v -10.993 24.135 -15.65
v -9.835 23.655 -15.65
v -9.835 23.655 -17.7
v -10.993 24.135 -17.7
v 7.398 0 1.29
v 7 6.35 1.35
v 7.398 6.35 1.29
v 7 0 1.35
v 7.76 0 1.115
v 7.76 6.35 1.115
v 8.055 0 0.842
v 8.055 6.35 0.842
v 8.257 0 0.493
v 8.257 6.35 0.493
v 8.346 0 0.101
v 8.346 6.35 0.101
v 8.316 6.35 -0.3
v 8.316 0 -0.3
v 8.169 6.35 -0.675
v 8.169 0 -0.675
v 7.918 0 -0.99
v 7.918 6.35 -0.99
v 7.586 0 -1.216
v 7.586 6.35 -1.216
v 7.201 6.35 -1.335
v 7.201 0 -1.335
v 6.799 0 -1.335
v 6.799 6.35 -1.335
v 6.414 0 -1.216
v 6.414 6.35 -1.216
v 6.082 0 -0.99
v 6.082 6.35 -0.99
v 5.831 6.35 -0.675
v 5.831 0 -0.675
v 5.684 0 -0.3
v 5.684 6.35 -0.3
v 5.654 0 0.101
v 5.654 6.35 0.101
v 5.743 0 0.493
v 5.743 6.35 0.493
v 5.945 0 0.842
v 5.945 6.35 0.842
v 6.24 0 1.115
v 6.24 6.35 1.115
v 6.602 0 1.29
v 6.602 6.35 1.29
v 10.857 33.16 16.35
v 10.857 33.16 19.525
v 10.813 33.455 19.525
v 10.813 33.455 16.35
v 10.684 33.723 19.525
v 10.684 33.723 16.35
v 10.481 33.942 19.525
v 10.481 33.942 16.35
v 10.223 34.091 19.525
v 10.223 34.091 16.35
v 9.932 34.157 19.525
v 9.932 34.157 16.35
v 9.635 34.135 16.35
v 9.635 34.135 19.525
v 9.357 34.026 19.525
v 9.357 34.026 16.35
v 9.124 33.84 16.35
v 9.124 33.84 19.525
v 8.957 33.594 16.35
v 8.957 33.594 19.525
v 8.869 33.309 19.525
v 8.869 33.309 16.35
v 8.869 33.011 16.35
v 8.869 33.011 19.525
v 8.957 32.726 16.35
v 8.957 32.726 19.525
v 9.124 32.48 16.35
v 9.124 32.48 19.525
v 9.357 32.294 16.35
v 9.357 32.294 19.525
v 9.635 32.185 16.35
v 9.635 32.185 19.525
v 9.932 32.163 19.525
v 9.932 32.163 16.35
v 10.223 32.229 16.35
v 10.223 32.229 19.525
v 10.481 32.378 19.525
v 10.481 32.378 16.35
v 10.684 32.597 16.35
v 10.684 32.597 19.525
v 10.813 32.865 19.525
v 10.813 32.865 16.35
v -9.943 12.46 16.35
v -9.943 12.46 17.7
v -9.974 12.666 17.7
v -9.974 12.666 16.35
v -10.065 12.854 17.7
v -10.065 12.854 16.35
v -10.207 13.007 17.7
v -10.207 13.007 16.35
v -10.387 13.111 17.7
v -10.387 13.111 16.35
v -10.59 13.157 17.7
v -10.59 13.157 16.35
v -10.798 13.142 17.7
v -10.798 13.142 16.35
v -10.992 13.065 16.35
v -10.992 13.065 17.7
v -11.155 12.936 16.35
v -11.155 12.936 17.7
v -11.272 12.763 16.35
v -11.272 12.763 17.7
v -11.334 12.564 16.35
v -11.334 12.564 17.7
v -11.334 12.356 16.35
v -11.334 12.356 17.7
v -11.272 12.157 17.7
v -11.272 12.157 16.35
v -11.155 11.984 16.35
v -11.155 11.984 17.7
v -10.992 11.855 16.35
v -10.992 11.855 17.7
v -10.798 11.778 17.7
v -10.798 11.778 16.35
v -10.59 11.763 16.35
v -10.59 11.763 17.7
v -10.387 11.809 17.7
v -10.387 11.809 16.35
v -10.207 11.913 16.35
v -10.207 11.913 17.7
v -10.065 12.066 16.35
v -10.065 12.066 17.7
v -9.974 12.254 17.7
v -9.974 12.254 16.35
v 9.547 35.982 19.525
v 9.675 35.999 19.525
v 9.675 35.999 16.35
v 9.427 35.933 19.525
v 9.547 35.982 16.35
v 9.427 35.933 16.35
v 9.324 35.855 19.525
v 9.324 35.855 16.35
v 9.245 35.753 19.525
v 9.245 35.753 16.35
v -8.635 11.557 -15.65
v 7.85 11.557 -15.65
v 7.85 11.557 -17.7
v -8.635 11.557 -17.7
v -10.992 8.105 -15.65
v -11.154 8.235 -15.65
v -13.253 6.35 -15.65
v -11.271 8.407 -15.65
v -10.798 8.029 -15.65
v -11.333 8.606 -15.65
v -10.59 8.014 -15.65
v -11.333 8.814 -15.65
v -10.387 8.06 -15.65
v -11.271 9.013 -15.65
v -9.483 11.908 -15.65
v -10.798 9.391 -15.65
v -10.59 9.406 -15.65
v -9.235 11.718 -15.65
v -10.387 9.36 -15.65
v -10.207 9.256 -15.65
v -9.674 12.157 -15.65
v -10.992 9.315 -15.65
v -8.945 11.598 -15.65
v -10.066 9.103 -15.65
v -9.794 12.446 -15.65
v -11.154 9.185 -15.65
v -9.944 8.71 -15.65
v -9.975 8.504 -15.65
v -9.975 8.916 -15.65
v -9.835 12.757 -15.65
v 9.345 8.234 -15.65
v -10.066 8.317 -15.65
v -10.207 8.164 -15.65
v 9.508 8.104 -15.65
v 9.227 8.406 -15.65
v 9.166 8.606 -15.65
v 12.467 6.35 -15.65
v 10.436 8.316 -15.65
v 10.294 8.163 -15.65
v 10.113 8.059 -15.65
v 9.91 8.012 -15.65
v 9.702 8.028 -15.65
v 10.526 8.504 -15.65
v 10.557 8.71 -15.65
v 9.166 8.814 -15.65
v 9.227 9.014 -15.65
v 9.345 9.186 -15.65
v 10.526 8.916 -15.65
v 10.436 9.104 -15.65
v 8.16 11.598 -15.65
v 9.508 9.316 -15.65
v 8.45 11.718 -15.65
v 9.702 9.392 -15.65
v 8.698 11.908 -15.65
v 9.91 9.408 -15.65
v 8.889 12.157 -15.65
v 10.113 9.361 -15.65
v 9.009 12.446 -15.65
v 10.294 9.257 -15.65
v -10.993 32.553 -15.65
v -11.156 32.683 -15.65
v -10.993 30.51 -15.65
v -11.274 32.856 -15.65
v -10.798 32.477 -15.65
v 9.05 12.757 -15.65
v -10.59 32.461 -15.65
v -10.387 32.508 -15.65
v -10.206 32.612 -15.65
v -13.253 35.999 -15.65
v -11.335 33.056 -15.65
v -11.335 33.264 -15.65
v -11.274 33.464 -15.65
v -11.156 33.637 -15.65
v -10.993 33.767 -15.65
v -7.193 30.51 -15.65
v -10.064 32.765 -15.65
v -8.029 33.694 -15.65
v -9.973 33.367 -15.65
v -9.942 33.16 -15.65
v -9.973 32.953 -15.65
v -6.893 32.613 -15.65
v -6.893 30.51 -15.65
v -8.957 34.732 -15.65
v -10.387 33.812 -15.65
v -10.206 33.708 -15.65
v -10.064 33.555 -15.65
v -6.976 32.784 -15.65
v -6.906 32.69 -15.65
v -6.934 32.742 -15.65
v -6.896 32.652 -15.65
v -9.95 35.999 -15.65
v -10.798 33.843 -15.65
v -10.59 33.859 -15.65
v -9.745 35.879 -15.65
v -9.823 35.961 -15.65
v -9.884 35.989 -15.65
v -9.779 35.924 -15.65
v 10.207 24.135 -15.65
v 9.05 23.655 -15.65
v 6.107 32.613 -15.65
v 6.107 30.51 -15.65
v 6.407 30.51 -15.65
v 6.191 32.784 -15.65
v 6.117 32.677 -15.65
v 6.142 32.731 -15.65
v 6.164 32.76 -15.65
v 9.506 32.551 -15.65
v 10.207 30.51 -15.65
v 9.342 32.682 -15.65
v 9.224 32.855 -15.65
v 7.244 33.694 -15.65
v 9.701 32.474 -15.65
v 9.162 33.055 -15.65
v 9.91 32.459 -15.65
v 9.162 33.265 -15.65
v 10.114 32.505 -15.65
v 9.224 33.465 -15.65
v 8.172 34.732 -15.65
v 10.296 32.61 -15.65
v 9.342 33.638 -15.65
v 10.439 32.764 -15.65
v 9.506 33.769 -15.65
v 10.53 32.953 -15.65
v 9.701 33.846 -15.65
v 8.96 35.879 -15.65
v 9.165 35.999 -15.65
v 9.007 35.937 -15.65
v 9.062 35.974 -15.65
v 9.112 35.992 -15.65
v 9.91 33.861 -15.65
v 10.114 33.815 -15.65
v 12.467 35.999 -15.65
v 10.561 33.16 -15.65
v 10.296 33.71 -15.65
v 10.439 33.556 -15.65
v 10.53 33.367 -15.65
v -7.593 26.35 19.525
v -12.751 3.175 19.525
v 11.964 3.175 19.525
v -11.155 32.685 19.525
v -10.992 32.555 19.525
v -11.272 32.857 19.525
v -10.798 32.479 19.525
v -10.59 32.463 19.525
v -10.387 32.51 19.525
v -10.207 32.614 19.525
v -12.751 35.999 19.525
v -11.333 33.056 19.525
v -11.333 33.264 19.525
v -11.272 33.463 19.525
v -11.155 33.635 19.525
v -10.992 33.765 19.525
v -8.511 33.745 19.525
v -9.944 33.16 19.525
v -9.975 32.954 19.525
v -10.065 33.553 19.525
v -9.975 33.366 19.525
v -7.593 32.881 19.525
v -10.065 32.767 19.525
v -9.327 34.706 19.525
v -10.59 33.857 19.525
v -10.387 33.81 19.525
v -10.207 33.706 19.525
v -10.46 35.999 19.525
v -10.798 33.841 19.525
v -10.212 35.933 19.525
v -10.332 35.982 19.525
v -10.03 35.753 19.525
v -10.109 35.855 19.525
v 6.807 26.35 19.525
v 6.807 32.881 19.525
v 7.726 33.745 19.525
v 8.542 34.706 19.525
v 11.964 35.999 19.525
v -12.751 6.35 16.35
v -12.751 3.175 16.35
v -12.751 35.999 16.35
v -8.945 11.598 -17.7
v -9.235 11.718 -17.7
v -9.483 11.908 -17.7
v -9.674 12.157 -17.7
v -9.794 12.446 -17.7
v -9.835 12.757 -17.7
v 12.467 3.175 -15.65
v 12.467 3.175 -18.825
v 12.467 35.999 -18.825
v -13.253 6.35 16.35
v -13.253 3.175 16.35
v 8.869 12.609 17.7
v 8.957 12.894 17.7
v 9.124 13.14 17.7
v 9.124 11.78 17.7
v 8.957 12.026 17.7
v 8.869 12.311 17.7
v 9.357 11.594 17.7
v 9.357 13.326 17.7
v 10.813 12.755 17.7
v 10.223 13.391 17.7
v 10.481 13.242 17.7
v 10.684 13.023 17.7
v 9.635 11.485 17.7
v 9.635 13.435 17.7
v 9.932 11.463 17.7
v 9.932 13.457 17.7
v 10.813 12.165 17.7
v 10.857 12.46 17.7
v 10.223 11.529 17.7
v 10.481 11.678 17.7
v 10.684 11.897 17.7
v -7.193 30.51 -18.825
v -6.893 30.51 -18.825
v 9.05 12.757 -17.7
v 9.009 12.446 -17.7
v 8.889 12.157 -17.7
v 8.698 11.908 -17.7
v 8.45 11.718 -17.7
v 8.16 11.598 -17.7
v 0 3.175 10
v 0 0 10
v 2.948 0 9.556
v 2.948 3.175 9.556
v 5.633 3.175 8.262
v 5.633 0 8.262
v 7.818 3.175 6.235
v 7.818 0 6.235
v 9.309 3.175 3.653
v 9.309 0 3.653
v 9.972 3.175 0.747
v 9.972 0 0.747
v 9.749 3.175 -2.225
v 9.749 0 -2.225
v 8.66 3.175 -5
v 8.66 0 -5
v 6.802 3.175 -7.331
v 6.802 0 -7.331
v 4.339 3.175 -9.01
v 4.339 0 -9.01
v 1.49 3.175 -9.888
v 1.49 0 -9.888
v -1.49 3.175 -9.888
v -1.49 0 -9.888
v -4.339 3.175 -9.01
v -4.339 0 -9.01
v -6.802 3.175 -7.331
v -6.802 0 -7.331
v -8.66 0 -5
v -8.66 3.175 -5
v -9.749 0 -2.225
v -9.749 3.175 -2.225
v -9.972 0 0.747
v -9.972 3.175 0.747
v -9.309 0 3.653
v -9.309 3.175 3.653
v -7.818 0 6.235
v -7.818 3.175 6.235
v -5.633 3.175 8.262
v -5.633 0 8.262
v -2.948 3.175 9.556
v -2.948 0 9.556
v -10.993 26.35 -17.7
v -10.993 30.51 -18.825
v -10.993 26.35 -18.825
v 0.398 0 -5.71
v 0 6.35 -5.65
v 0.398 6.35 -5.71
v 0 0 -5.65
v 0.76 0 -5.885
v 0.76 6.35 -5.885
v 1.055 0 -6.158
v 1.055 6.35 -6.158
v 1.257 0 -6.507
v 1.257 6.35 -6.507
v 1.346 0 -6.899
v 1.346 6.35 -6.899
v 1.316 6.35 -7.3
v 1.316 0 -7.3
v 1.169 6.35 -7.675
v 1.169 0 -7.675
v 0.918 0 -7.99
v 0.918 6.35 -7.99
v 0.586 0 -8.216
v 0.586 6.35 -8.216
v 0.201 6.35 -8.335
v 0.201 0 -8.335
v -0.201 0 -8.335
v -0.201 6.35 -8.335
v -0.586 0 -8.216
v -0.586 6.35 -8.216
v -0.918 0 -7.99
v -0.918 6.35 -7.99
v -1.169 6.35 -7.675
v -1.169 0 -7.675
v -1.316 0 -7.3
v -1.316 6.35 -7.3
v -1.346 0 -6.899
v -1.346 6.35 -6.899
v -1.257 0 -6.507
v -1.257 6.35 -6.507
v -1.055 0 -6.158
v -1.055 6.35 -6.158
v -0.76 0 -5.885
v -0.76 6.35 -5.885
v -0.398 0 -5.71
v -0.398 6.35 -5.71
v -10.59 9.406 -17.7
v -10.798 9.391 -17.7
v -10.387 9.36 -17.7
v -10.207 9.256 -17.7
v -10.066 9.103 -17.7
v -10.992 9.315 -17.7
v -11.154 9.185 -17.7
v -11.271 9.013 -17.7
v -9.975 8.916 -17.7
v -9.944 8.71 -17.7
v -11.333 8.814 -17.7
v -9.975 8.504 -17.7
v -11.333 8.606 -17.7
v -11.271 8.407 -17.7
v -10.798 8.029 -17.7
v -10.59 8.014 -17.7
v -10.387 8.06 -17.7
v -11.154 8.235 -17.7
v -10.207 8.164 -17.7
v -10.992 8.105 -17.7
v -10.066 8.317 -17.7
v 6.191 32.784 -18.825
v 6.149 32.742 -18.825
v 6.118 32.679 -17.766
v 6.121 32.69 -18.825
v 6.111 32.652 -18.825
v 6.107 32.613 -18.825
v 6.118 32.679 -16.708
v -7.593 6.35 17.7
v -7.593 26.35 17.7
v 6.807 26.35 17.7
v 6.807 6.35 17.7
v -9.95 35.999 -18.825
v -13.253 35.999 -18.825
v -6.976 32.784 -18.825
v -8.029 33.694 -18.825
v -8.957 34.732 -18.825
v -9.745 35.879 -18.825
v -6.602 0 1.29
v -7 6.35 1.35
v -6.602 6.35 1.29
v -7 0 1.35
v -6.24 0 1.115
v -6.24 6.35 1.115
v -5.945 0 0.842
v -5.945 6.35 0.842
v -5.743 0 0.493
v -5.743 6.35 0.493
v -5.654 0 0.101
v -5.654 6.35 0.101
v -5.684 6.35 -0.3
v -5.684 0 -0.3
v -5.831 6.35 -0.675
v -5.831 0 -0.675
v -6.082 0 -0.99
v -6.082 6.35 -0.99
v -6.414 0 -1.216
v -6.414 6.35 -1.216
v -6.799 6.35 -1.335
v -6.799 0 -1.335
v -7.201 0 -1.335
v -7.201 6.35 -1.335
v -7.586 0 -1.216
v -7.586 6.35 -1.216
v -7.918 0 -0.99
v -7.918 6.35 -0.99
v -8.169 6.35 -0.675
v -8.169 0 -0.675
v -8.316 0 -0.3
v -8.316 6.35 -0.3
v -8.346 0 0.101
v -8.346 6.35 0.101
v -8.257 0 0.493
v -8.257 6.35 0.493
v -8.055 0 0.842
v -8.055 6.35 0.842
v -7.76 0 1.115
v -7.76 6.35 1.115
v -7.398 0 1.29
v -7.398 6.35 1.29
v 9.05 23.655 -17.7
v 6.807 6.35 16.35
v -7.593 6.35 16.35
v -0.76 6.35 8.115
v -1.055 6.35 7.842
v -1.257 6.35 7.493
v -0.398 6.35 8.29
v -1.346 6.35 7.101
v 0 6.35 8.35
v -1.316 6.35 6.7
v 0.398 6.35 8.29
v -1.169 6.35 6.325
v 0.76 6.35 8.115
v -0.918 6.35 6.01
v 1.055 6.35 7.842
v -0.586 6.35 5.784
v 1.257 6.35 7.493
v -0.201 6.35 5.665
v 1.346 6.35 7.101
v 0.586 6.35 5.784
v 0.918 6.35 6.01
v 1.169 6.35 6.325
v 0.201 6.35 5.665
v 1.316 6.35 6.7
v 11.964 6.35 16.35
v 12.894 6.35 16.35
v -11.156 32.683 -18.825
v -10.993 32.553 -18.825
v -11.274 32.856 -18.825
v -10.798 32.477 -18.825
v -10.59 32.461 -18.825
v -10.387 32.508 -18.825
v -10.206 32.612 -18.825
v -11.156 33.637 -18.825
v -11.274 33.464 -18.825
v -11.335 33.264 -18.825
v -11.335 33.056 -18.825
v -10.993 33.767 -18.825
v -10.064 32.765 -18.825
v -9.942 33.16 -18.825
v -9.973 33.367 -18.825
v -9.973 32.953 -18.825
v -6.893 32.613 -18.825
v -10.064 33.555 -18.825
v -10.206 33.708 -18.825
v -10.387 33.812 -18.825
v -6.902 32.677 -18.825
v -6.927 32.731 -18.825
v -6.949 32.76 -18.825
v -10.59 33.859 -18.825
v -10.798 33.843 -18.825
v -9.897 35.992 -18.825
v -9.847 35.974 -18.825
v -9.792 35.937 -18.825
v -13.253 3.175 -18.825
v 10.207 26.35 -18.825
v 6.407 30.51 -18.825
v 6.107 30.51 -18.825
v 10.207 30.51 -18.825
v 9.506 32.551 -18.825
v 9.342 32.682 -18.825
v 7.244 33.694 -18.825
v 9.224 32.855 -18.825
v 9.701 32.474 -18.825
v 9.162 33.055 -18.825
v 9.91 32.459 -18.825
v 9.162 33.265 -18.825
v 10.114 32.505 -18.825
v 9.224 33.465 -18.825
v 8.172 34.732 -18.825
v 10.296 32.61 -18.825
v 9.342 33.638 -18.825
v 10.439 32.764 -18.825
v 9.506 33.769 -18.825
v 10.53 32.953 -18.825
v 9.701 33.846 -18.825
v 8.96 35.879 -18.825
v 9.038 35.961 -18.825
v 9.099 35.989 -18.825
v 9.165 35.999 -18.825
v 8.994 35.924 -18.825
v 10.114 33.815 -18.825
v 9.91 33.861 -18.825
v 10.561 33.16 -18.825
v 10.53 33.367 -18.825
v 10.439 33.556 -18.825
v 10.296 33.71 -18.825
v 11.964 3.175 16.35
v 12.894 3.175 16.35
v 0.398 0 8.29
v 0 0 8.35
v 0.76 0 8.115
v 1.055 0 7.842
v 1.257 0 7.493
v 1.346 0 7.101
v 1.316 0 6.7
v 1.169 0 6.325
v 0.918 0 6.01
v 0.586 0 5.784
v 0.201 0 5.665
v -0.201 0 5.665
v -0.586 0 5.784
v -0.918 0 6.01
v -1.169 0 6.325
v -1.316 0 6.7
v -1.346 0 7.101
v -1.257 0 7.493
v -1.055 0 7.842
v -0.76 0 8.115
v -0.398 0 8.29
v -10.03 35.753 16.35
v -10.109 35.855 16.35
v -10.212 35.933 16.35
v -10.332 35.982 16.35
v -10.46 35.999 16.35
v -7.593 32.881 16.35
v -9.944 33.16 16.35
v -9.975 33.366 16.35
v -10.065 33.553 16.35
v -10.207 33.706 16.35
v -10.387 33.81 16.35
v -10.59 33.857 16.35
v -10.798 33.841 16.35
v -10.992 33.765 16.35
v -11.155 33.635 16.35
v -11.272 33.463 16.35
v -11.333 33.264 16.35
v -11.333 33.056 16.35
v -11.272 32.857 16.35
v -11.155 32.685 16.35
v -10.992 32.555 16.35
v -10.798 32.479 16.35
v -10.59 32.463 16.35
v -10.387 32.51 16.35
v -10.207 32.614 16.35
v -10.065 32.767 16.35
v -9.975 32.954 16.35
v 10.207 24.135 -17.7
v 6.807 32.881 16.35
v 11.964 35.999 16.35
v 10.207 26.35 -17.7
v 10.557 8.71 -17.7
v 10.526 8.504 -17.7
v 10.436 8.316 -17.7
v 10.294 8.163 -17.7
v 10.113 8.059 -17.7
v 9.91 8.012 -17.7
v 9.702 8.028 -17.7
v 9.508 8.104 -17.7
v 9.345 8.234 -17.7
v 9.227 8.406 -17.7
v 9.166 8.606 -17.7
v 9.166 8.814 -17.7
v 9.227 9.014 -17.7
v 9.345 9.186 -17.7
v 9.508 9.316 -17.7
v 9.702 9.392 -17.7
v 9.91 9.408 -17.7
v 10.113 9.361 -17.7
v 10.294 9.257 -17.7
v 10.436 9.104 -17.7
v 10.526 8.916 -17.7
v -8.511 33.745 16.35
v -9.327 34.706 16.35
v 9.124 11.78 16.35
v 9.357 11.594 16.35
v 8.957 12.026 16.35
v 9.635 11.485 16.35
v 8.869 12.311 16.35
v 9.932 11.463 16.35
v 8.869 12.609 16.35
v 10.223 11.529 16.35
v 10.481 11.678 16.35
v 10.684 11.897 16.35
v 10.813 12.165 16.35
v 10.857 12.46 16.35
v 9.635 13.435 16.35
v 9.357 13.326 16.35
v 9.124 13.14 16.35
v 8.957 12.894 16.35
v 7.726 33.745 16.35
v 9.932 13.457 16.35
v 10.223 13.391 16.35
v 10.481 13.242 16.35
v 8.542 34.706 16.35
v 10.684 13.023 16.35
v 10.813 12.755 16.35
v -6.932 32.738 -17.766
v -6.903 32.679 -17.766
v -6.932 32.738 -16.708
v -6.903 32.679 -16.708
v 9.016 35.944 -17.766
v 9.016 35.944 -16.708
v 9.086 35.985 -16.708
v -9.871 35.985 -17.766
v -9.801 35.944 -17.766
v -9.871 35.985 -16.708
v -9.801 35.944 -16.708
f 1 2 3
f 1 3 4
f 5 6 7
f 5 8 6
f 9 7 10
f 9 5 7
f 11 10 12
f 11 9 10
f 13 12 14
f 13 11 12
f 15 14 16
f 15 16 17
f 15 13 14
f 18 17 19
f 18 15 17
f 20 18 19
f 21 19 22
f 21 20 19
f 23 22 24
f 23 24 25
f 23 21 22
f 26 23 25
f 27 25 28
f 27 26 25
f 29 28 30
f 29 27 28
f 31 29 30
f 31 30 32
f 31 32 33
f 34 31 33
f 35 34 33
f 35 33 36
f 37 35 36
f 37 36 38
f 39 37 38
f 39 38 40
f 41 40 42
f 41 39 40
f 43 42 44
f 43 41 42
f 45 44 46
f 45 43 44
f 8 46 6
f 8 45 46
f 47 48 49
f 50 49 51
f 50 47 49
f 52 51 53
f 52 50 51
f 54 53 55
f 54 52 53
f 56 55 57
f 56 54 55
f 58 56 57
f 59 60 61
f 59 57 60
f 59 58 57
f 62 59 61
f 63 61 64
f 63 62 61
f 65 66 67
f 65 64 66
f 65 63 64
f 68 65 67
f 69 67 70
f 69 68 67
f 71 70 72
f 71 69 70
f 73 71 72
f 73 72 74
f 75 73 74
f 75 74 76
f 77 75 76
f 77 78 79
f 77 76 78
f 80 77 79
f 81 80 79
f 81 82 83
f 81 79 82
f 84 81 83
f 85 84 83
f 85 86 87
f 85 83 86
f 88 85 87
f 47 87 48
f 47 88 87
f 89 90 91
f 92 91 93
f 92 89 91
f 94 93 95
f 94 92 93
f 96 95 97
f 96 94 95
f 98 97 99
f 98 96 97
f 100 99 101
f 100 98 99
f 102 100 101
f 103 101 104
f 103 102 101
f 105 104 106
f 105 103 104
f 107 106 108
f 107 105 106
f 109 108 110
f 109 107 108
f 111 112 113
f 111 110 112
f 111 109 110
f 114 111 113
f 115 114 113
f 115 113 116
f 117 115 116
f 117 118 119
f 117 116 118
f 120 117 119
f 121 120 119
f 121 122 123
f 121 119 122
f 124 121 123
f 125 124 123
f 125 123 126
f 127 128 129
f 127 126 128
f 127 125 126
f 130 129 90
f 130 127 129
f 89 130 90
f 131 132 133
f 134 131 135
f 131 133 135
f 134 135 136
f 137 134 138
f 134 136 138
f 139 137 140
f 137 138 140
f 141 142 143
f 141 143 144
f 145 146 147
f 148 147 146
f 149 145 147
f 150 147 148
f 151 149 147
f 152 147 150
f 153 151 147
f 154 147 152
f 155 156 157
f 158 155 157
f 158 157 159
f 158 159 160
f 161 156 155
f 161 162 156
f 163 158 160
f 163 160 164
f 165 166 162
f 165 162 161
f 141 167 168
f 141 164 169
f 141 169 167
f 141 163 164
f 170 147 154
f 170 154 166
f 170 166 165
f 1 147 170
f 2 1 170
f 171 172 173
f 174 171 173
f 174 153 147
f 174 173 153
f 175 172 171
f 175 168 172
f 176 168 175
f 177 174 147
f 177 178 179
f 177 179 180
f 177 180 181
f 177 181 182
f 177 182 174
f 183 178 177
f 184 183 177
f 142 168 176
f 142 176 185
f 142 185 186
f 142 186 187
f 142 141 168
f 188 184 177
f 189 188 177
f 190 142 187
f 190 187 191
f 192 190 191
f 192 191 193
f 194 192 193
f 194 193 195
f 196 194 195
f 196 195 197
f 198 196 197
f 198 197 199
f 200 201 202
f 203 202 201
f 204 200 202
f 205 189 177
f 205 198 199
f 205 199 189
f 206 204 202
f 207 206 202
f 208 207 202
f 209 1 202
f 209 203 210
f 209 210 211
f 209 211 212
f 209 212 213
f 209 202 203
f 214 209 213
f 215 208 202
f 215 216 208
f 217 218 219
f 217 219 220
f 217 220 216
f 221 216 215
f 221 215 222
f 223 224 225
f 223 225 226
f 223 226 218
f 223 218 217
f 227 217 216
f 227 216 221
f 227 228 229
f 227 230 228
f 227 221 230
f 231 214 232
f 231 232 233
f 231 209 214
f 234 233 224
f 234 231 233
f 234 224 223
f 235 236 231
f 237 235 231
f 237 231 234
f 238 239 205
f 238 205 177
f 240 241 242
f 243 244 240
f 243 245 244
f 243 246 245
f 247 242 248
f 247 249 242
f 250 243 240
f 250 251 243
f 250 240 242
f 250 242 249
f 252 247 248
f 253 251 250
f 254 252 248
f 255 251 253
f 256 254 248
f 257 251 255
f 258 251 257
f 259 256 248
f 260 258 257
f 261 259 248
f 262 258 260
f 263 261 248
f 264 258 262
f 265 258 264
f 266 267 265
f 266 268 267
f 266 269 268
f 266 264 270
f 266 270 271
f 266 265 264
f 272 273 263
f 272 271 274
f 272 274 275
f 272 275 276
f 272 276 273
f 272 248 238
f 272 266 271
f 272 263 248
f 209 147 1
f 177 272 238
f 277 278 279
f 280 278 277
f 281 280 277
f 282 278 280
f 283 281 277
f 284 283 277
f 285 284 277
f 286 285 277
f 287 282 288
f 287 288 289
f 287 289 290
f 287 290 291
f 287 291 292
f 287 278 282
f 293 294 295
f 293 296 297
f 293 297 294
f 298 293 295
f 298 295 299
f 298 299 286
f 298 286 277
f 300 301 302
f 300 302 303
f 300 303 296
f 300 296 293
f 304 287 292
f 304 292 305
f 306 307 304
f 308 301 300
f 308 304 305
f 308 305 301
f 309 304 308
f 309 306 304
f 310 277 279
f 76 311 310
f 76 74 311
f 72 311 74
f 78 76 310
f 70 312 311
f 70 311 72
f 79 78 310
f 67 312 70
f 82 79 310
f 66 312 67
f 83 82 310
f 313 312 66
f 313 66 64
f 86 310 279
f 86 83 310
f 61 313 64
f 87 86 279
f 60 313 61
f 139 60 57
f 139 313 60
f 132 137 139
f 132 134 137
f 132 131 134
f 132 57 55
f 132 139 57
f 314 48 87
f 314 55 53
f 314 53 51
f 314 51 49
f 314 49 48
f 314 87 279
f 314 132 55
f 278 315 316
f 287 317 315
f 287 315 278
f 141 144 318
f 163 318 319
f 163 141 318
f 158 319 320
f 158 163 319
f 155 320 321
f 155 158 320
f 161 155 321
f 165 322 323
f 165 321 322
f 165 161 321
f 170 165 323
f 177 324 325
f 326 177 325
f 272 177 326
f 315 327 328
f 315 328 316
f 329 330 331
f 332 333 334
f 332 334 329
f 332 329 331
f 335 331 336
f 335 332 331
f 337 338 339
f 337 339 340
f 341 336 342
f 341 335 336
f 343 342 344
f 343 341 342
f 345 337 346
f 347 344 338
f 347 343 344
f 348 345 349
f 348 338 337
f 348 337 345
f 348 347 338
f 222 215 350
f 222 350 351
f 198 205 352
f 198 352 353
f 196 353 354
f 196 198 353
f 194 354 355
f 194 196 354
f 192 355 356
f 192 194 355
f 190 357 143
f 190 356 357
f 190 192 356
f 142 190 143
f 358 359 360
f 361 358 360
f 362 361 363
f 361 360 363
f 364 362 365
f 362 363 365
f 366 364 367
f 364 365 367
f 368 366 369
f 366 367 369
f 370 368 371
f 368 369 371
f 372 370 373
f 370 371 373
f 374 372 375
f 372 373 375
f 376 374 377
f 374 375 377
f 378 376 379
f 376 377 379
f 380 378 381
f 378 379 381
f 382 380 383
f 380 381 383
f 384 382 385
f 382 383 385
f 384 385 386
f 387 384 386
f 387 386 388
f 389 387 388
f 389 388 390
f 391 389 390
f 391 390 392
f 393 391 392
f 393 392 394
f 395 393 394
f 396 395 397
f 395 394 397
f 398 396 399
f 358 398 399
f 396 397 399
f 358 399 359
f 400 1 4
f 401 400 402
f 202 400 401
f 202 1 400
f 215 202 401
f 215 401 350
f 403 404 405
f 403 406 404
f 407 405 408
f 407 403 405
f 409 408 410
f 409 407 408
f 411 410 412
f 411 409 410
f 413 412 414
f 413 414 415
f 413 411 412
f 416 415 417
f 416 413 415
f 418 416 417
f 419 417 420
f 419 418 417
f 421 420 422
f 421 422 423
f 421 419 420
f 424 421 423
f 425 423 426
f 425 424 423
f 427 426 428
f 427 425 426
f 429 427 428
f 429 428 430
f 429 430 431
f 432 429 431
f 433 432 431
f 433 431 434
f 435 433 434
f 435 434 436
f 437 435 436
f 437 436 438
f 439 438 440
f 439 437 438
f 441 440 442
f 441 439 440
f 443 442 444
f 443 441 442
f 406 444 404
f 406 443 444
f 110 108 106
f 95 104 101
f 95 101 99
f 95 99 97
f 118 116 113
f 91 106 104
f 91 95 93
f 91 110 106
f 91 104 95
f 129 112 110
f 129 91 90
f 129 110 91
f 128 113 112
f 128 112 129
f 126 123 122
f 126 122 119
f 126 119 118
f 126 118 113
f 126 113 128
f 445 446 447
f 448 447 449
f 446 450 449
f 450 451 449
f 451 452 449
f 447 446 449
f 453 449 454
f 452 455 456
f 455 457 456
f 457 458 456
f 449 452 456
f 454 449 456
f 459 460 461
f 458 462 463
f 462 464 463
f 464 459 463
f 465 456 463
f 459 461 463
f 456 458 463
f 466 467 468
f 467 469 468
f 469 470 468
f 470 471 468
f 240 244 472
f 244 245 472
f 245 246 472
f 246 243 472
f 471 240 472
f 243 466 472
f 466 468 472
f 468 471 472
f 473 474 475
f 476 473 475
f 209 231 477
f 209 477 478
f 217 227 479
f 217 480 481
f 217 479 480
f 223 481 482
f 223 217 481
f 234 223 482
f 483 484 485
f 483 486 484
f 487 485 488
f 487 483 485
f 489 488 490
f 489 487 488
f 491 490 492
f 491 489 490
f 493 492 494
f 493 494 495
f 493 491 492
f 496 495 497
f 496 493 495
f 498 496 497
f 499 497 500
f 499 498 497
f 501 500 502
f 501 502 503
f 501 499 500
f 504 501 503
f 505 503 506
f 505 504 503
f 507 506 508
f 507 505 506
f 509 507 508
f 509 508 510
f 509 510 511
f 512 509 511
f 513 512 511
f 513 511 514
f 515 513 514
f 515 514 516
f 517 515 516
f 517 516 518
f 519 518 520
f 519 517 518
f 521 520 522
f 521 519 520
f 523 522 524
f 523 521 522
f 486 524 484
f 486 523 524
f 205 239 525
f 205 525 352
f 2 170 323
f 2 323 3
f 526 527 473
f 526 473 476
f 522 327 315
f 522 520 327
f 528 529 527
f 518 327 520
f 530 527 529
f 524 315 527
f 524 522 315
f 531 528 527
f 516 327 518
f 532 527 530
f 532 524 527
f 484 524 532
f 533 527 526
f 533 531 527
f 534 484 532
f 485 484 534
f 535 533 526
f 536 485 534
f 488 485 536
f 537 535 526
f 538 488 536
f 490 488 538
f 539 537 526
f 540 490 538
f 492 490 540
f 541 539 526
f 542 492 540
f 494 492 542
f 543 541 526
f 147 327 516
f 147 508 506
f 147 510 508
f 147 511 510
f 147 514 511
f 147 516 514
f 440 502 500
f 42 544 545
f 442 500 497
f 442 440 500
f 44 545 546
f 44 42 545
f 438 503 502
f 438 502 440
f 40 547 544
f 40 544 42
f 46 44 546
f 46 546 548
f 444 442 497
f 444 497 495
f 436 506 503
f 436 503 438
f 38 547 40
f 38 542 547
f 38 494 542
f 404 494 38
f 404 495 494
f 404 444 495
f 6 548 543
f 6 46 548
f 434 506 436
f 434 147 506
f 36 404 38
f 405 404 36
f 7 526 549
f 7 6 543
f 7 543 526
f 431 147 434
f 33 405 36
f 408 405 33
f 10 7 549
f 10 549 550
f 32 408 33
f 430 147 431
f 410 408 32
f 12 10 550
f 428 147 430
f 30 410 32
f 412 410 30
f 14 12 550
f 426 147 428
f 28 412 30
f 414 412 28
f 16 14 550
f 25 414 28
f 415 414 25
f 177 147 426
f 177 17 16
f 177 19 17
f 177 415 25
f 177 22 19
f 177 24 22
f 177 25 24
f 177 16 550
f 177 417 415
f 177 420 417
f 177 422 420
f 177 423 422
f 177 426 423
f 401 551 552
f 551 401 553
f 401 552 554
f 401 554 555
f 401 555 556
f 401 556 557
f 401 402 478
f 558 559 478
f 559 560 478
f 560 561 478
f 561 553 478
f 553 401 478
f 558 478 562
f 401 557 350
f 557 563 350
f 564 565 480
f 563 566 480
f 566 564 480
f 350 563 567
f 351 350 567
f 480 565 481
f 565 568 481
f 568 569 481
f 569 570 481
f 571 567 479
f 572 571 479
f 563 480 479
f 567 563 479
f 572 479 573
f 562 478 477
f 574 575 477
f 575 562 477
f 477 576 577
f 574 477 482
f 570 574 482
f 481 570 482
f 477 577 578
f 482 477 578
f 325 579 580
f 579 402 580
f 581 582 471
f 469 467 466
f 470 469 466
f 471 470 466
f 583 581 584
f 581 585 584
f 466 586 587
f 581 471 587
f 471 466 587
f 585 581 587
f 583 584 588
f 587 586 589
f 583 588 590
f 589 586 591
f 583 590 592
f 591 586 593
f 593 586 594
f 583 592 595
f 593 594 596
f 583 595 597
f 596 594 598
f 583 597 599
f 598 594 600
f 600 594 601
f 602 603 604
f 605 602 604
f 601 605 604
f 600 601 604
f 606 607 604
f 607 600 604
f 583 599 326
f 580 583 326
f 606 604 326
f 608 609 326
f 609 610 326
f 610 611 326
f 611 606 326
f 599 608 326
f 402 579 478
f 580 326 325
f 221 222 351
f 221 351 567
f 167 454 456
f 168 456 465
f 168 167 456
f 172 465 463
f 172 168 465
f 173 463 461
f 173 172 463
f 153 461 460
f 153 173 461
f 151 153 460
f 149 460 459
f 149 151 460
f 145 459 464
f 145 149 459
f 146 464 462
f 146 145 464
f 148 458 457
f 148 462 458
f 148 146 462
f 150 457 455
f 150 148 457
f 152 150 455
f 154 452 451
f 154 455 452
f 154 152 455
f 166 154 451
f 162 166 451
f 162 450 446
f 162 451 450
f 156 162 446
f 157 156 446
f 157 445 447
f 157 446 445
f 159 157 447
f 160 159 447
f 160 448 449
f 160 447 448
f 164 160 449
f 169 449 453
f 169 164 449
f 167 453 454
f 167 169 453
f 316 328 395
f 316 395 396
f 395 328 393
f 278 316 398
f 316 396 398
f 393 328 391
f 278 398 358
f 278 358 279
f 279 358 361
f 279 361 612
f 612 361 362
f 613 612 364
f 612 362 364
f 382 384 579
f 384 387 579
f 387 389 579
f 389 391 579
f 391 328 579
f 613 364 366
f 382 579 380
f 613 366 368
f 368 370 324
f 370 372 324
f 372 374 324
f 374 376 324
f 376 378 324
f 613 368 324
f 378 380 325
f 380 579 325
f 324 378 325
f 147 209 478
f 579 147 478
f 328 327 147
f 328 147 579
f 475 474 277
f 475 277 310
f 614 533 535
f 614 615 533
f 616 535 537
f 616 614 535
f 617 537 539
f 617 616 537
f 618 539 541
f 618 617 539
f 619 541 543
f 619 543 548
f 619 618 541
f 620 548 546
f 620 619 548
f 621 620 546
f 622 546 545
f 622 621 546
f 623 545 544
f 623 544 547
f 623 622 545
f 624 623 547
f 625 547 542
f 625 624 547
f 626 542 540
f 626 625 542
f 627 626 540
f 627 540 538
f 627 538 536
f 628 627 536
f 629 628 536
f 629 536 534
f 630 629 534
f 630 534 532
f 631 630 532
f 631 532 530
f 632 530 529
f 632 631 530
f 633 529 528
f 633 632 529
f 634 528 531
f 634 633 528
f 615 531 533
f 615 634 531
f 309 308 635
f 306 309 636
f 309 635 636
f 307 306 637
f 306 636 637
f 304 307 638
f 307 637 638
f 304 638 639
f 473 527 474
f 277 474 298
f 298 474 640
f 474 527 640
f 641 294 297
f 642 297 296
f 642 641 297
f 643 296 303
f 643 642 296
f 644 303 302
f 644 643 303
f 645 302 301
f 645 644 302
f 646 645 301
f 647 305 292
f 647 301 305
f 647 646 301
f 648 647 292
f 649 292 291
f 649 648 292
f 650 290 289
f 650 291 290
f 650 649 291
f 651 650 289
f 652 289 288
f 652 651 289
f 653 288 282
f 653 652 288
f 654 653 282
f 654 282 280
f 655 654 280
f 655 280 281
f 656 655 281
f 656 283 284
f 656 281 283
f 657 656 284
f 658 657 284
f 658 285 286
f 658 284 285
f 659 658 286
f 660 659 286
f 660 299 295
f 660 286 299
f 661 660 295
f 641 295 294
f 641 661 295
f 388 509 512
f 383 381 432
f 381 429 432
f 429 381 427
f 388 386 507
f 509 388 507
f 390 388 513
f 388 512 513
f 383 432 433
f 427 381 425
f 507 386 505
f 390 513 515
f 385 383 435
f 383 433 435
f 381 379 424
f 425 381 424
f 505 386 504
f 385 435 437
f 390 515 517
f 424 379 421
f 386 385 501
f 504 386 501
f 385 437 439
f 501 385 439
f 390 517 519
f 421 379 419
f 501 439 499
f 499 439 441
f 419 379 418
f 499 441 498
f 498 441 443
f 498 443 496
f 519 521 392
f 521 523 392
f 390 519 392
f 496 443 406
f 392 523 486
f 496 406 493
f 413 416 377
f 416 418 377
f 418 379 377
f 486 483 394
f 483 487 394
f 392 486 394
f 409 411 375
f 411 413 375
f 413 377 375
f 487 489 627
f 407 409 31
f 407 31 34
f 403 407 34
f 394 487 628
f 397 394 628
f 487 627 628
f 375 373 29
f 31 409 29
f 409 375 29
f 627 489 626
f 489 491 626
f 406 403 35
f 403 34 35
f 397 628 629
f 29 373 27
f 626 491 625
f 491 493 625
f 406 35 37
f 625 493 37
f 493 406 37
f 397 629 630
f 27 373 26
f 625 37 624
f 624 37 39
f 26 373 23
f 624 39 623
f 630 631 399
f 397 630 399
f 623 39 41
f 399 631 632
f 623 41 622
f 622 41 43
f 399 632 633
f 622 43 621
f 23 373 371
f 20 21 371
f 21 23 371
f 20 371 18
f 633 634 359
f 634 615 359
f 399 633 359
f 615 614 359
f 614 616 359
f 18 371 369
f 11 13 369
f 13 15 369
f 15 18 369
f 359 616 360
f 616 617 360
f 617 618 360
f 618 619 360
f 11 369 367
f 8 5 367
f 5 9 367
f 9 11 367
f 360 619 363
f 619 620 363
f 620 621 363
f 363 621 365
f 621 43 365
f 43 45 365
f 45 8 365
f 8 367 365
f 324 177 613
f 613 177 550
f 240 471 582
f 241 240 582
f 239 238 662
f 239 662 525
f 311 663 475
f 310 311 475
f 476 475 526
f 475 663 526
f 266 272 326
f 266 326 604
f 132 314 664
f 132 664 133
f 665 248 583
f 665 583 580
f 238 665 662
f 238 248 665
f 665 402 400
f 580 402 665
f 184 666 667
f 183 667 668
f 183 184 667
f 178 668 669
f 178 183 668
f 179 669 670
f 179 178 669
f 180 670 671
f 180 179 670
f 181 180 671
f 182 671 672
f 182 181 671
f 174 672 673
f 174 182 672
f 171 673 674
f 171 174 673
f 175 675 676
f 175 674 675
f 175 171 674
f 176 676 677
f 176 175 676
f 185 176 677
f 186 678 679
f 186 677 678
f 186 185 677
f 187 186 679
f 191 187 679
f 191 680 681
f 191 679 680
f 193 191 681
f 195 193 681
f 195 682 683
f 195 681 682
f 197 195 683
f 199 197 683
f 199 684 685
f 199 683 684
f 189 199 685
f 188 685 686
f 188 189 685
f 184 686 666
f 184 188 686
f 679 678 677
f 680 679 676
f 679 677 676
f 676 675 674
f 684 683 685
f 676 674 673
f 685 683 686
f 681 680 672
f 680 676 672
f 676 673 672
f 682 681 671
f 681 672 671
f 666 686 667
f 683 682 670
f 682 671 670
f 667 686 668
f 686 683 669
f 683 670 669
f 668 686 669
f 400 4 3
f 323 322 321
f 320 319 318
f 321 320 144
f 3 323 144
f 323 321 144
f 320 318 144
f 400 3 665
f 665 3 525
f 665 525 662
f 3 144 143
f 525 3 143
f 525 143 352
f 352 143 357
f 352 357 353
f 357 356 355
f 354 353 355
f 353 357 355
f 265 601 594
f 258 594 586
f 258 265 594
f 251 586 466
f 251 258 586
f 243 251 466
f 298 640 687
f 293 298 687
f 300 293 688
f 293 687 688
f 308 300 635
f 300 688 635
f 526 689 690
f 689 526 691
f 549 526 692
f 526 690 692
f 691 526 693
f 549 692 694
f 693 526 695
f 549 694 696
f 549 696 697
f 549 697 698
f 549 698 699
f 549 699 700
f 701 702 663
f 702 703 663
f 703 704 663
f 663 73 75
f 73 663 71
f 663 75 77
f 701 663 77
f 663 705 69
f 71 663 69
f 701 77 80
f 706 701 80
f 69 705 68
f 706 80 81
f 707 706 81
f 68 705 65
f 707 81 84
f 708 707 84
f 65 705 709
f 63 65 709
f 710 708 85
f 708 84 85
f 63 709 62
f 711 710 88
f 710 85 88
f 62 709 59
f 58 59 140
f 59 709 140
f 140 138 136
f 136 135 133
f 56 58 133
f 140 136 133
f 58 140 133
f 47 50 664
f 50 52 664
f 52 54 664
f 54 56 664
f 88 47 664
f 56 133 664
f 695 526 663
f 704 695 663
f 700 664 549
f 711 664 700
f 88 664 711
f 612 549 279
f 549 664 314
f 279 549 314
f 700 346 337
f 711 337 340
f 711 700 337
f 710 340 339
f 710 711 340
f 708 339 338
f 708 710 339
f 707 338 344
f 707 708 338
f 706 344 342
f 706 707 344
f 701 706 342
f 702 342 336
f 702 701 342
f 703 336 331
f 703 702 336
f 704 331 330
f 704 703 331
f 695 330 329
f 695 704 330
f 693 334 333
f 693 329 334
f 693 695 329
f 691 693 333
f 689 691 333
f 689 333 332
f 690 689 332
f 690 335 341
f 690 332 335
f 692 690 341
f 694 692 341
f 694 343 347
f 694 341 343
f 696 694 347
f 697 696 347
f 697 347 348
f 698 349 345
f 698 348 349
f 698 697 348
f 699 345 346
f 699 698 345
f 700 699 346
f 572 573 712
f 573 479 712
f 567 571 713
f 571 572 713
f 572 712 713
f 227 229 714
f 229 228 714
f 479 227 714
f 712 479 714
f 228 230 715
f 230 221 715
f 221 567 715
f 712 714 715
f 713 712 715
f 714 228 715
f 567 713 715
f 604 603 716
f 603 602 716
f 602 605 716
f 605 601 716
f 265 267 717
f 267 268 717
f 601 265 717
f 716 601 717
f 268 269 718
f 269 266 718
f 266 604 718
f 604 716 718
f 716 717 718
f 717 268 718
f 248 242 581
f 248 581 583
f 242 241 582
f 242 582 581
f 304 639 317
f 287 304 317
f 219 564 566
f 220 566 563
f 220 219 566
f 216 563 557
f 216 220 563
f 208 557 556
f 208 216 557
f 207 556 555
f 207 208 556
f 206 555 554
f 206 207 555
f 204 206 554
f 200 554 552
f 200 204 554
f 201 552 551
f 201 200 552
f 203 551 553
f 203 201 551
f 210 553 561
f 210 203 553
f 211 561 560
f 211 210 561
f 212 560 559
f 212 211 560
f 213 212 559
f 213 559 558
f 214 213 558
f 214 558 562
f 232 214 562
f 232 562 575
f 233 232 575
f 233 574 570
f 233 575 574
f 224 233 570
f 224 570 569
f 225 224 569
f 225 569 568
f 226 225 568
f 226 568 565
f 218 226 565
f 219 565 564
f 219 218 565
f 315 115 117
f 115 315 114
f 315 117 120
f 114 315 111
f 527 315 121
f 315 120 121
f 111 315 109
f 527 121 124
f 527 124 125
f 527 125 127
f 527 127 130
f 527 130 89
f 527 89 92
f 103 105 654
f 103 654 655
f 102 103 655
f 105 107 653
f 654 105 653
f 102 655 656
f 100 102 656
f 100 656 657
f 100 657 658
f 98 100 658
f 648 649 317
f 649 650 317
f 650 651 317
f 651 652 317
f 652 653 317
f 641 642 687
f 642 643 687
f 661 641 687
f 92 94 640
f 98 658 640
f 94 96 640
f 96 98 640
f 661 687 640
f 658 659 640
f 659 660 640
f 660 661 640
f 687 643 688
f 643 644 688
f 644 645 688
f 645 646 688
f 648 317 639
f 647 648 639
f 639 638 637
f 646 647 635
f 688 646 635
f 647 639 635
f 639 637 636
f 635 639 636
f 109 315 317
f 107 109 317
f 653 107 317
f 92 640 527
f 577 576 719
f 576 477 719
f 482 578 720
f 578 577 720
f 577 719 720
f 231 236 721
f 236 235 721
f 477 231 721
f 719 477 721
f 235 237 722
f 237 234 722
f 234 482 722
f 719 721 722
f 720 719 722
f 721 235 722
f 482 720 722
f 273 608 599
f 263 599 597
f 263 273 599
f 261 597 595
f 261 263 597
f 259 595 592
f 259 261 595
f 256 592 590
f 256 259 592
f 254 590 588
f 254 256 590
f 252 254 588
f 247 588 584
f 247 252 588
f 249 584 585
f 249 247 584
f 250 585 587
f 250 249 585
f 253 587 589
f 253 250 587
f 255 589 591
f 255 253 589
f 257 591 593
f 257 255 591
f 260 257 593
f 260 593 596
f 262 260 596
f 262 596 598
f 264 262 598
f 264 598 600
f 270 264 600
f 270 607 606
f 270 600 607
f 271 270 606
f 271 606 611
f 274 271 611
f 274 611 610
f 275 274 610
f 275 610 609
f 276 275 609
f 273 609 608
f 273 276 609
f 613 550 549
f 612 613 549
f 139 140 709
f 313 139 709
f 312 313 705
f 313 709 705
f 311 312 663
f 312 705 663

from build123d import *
from OCP.BRepAlgoAPI import BRepAlgoAPI_Cut
from OCP.TopTools import TopTools_ListOfShape

# Parameters (mm, degrees)
SKETCH1_R                 = 10
SKETCH1_R_2               = 1.35
BOSS_EXTRUDE1_DEPTH       = 3.175
SKETCH2_W                 = 38.058543228
SKETCH2_H                 = 41.75
SKETCH2_R                 = 1.35
BOSS_EXTRUDE2_DEPTH       = 3.175
SKETCH3_W                 = 38.058543228
SKETCH3_H                 = 41.75
SKETCH3_W_2               = 31.708543228
SKETCH3_H_2               = 35.4
BOSS_EXTRUDE3_DEPTH       = 20
FILLET1_R                 = 5
BOSS_EXTRUDE4_OUTLINE_R   = 1
BOSS_EXTRUDE4_OUTLINE_R_2 = 0.698520241
BOSS_EXTRUDE4_OUTLINE_R_3 = 0.699131638
BOSS_EXTRUDE4_DEPTH       = 4.524579022
SKETCH6_R                 = 0.699665004
SKETCH6_R_2               = 0.703272365
SKETCH6_R_3               = 0.700673295
SKETCH6_R_4               = 0.698053945
BOSS_EXTRUDE5_DEPTH       = 5.225420978
CUT_EXTRUDE3_DEPTH        = 39.629021569
CUT_EXTRUDE4_DEPTH        = 44.672508997


with BuildPart() as part:
    # Sketch1 → Boss-Extrude1 (new body)
    with BuildSketch(Plane(origin=(0, 0, 0), x_dir=(1, 0, 0), z_dir=(0, 1, 0))):
        with Locations(Location((0, 0, 0), (0, 0, 270))):
            Circle(SKETCH1_R)
        with Locations(Location((0, 7, 0), (0, 0, 270))):
            Circle(SKETCH1_R_2, mode=Mode.SUBTRACT)
        with Locations(Location((7, 0, 0), (0, 0, 270))):
            Circle(SKETCH1_R_2, mode=Mode.SUBTRACT)
        with Locations(Location((0, -7, 0), (0, 0, 270))):
            Circle(SKETCH1_R_2, mode=Mode.SUBTRACT)
        with Locations(Location((-7, 0, 0), (0, 0, 270))):
            Circle(SKETCH1_R_2, mode=Mode.SUBTRACT)
    extrude(amount=BOSS_EXTRUDE1_DEPTH)

    # Sketch2 → Boss-Extrude2 (add)
    with BuildSketch(Plane(origin=(0, 3.175, 0), x_dir=(1, 0, 0), z_dir=(0, 1, 0))):
        Rectangle(SKETCH2_W, SKETCH2_H)
        with Locations(Location((0, -7, 0), (0, 0, 270))):
            Circle(SKETCH2_R, mode=Mode.SUBTRACT)
        with Locations(Location((7, 0, 0), (0, 0, 270))):
            Circle(SKETCH2_R, mode=Mode.SUBTRACT)
        with Locations(Location((-7, 0, 0), (0, 0, 270))):
            Circle(SKETCH2_R, mode=Mode.SUBTRACT)
        with Locations(Location((0, 7, 0), (0, 0, 270))):
            Circle(SKETCH2_R, mode=Mode.SUBTRACT)
    extrude(amount=BOSS_EXTRUDE2_DEPTH)

    # Sketch3 → Boss-Extrude3 (add)
    with BuildSketch(Plane(origin=(0, 6.35, 0), x_dir=(1, 0, 0), z_dir=(0, 1, 0))):
        Rectangle(SKETCH3_W, SKETCH3_H)
        Rectangle(SKETCH3_W_2, SKETCH3_H_2, mode=Mode.SUBTRACT)
    extrude(amount=BOSS_EXTRUDE3_DEPTH)

    # Fillet1
    fillet1_edges = [part.edges().sort_by_distance(p)[0] for p in [
        (-19.029271614, 14.7625, -20.875),
        (-19.029271614, 14.7625, 20.875),
        (19.029271614, 14.7625, 20.875),
        (19.029271614, 14.7625, -20.875),
    ]]
    fillet(fillet1_edges, radius=FILLET1_R)

    # Boss-Extrude4: read off the stored shape, not the designer's step
    # Boss-Extrude4 outline → Boss-Extrude4 (add)
    # profile 1 of 2: a face of its own
    with BuildSketch(Plane.XY.offset(16.350420978)):
        with BuildLine():
            ThreePointArc((9.674791631, 35.998523082), (9.427181956, 35.932908065), (9.244559074, 35.753284112))
            ThreePointArc((9.244559074, 35.753284112), (8.147643376, 34.213929311), (6.807481387, 32.880961337))
            Line((6.807481387, 32.880961337), (6.807482447, 6.35))
            Line((6.807482447, 6.35), (11.963760646, 6.35))
            Line((11.963760646, 6.35), (11.963760646, 35.998520144))
            Line((11.963760646, 35.998520144), (9.674791631, 35.998523082))
        make_face()
        with Locations((9.857482447, 33.16)):
            Circle(BOSS_EXTRUDE4_OUTLINE_R, mode=Mode.SUBTRACT)
        with Locations((9.857482447, 12.46)):
            Circle(BOSS_EXTRUDE4_OUTLINE_R, mode=Mode.SUBTRACT)
    # profile 2 of 2: a face of its own
    with BuildSketch(Plane.XY.offset(16.350420978)):
        with BuildLine():
            Line((-12.751066043, 35.998520144), (-12.751066043, 6.35))
            Line((-12.751066043, 6.35), (-7.592517553, 6.35))
            Line((-7.592517553, 6.35), (-7.592516964, 32.880958857))
            ThreePointArc((-7.592516964, 32.880958857), (-8.932679762, 34.213927416), (-10.029597495, 35.753282149))
            ThreePointArc((-10.029597495, 35.753282149), (-10.212218516, 35.932905514), (-10.459826737, 35.998520144))
            Line((-10.459826737, 35.998520144), (-12.751066043, 35.998520144))
        make_face()
        with Locations((-10.642517553, 33.16)):
            Circle(BOSS_EXTRUDE4_OUTLINE_R_2, mode=Mode.SUBTRACT)
        with Locations((-10.642517553, 12.46)):
            Circle(BOSS_EXTRUDE4_OUTLINE_R_3, mode=Mode.SUBTRACT)
    extrude(amount=BOSS_EXTRUDE4_DEPTH)

    # Sketch6 → Boss-Extrude5 (add)
    with BuildSketch(Plane(origin=(0, 0, -15.649579022), x_dir=(-1, 0, 0), z_dir=(0, 0, -1))):
        with BuildLine():
            Line((10.992517553, 24.135), (10.992517553, 30.51))
            Line((10.992517553, 30.51), (7.192517366, 30.510000072))
            Line((7.192517366, 30.510000072), (6.892517553, 30.510000072))
            Line((6.892517553, 30.510000072), (6.892517553, 32.612557612))
            add(Edge.make_bspline(
                [(6.975743415, 32.783855976), (6.958921233, 32.771091761), (6.928542383, 32.73934935), (6.899316538, 32.679660552), (6.892517469, 32.634957243), (6.892517553, 32.612557612)],
                knots=[1.062e-06, 1.062e-06, 1.062e-06, 1.062e-06, 0.322323684, 0.658094096, 1, 1, 1, 1], degree=3, weights=[1, 1, 1, 1, 1, 1]))
            ThreePointArc((6.975743415, 32.783855976), (8.509170356, 34.198162413), (9.744817778, 35.878887355))
            add(Edge.make_bspline(
                [(9.950114528, 35.998516481), (9.923391157, 35.998516414), (9.869066225, 35.989019468), (9.796326784, 35.947026629), (9.759487209, 35.903468994), (9.744817778, 35.878887355)],
                knots=[0, 0, 0, 0, 0.324047023, 0.652881456, 1, 1, 1, 1], degree=3, weights=[1, 1, 1, 1, 1, 1]))
            Line((9.950114528, 35.998516481), (11.752517552, 35.998516481))
            Line((11.752517552, 35.998516481), (13.252517552, 35.998516481))
            Line((13.252517552, 35.998516481), (13.252517552, 6.318190736))
            Line((13.252517552, 6.318190736), (-12.46748245, 6.318190736))
            Line((-12.46748245, 6.318190736), (-12.46748245, 35.998516481))
            Line((-12.46748245, 35.998516481), (-10.96748245, 35.998516481))
            Line((-10.96748245, 35.998516481), (-9.165078771, 35.998516481))
            add(Edge.make_bspline(
                [(-8.959782959, 35.878887832), (-8.974454973, 35.903473814), (-9.011299786, 35.947034481), (-9.084041461, 35.989022268), (-9.138360889, 35.998516579), (-9.165078771, 35.998516481)],
                knots=[3.25e-07, 3.25e-07, 3.25e-07, 3.25e-07, 0.347182134, 0.676017862, 1, 1, 1, 1], degree=3, weights=[1, 1, 1, 1, 1, 1]))
            ThreePointArc((-8.959782959, 35.878887832), (-7.72413548, 34.198162669), (-6.190708414, 32.783856055))
            add(Edge.make_bspline(
                [(-6.107482447, 32.612555023), (-6.107481996, 32.634920643), (-6.114271613, 32.679614721), (-6.143476784, 32.739319032), (-6.173880837, 32.77108775), (-6.190708414, 32.783856055)],
                knots=[0, 0, 0, 0, 0.341381322, 0.677579946, 1, 1, 1, 1], degree=3, weights=[1, 1, 1, 1, 1, 1]))
            Line((-6.107482447, 32.612555023), (-6.107482447, 30.510000072))
            Line((-6.107482447, 30.510000072), (-6.407482262, 30.510000072))
            Line((-6.407482262, 30.510000072), (-10.207482447, 30.51))
            Line((-10.207482447, 30.51), (-10.207482447, 24.135))
            Line((-10.207482447, 24.135), (-9.049769141, 23.654765682))
            Line((-9.049769141, 23.654765682), (-9.049769141, 12.756914674))
            ThreePointArc((-9.049769141, 12.756914674), (-8.698297278, 11.908386539), (-7.849769141, 11.556914678))
            Line((-7.849769141, 11.556914678), (8.634804248, 11.556914678))
            ThreePointArc((8.634804248, 11.556914678), (9.483332385, 11.908386541), (9.834804247, 12.756914678))
            Line((9.834804247, 12.756914678), (9.834804247, 23.654765682))
            Line((9.834804247, 23.654765682), (10.992517553, 24.135))
        make_face()
        with Locations(Location((-9.857482447, 8.71, 0), (0, 0, 180))):
            Circle(SKETCH6_R, mode=Mode.SUBTRACT)
        with Locations(Location((-9.857482447, 33.16, 0), (0, 0, 180))):
            Circle(SKETCH6_R_2, mode=Mode.SUBTRACT)
        with Locations(Location((10.642517553, 33.16, 0), (0, 0, 180))):
            Circle(SKETCH6_R_3, mode=Mode.SUBTRACT)
        with Locations(Location((10.642517553, 8.71, 0), (0, 0, 180))):
            Circle(SKETCH6_R_4, mode=Mode.SUBTRACT)
    extrude(amount=BOSS_EXTRUDE5_DEPTH)

    # Sketch7 → Cut-Extrude3 (cut, through all)
    with BuildSketch(Plane(origin=(0, 26.35, 0), x_dir=(1, 0, 0), z_dir=(0, 1, 0))):
        Polygon((11.963760646, -16.350420978), (11.963760646, -22.528007323), (30.022930958, -23.761888284), (27.696884363, 28.84716935), (12.46748245, 20.875), (12.46748245, 15.649579022), (12.894365171, -16.350420978), align=None)
        Polygon((-12.751066043, -16.350420978), (-12.751066043, -23.761888284), (-21.517724294, -22.528007323), (-21.901635858, 22.206155736), (-13.252517552, 20.875), (-13.252517552, -16.350420978), align=None)
    extrude(amount=-CUT_EXTRUDE3_DEPTH, mode=Mode.SUBTRACT)


with BuildPart() as cut_extrude4_tool:
    # Sketch9 → Cut-Extrude4 (new, through all)
    with BuildSketch(Plane(origin=(-2e-09, 35.998516482, 0), x_dir=(1.0, 6.10309035182258e-11, 0), z_dir=(-6.10309035182258e-11, 1.0, -1.0368003232160358e-14))):
        Polygon((-12.751066041, -19.525420978), (13.891993445, -19.525420978), (13.555046053, -22.524424576), (-19.185008861, -22.524424576), align=None)
        Polygon((-13.25251755, 18.824579022), (15.127467216, 18.824579022), (13.105782864, 23.749676422), (-20.139693138, 23.131939537), align=None)
    extrude(amount=-CUT_EXTRUDE4_DEPTH)


with BuildPart() as part_1:
    add(part.part)

    # Cut-Extrude4: cut by cut_extrude4_tool, with a tolerance
    cut_extrude4_stock = TopTools_ListOfShape()
    cut_extrude4_stock.Append(part_1.part.wrapped)
    cut_extrude4_tools = TopTools_ListOfShape()
    cut_extrude4_tools.Append(cut_extrude4_tool.part.wrapped)
    cut_extrude4_cut = BRepAlgoAPI_Cut()
    cut_extrude4_cut.SetArguments(cut_extrude4_stock)
    cut_extrude4_cut.SetTools(cut_extrude4_tools)
    cut_extrude4_cut.SetFuzzyValue(0.00001)
    cut_extrude4_cut.Build()
    add(Compound.cast(cut_extrude4_cut.Shape()).solids(), mode=Mode.REPLACE)


solid = part_1.part
